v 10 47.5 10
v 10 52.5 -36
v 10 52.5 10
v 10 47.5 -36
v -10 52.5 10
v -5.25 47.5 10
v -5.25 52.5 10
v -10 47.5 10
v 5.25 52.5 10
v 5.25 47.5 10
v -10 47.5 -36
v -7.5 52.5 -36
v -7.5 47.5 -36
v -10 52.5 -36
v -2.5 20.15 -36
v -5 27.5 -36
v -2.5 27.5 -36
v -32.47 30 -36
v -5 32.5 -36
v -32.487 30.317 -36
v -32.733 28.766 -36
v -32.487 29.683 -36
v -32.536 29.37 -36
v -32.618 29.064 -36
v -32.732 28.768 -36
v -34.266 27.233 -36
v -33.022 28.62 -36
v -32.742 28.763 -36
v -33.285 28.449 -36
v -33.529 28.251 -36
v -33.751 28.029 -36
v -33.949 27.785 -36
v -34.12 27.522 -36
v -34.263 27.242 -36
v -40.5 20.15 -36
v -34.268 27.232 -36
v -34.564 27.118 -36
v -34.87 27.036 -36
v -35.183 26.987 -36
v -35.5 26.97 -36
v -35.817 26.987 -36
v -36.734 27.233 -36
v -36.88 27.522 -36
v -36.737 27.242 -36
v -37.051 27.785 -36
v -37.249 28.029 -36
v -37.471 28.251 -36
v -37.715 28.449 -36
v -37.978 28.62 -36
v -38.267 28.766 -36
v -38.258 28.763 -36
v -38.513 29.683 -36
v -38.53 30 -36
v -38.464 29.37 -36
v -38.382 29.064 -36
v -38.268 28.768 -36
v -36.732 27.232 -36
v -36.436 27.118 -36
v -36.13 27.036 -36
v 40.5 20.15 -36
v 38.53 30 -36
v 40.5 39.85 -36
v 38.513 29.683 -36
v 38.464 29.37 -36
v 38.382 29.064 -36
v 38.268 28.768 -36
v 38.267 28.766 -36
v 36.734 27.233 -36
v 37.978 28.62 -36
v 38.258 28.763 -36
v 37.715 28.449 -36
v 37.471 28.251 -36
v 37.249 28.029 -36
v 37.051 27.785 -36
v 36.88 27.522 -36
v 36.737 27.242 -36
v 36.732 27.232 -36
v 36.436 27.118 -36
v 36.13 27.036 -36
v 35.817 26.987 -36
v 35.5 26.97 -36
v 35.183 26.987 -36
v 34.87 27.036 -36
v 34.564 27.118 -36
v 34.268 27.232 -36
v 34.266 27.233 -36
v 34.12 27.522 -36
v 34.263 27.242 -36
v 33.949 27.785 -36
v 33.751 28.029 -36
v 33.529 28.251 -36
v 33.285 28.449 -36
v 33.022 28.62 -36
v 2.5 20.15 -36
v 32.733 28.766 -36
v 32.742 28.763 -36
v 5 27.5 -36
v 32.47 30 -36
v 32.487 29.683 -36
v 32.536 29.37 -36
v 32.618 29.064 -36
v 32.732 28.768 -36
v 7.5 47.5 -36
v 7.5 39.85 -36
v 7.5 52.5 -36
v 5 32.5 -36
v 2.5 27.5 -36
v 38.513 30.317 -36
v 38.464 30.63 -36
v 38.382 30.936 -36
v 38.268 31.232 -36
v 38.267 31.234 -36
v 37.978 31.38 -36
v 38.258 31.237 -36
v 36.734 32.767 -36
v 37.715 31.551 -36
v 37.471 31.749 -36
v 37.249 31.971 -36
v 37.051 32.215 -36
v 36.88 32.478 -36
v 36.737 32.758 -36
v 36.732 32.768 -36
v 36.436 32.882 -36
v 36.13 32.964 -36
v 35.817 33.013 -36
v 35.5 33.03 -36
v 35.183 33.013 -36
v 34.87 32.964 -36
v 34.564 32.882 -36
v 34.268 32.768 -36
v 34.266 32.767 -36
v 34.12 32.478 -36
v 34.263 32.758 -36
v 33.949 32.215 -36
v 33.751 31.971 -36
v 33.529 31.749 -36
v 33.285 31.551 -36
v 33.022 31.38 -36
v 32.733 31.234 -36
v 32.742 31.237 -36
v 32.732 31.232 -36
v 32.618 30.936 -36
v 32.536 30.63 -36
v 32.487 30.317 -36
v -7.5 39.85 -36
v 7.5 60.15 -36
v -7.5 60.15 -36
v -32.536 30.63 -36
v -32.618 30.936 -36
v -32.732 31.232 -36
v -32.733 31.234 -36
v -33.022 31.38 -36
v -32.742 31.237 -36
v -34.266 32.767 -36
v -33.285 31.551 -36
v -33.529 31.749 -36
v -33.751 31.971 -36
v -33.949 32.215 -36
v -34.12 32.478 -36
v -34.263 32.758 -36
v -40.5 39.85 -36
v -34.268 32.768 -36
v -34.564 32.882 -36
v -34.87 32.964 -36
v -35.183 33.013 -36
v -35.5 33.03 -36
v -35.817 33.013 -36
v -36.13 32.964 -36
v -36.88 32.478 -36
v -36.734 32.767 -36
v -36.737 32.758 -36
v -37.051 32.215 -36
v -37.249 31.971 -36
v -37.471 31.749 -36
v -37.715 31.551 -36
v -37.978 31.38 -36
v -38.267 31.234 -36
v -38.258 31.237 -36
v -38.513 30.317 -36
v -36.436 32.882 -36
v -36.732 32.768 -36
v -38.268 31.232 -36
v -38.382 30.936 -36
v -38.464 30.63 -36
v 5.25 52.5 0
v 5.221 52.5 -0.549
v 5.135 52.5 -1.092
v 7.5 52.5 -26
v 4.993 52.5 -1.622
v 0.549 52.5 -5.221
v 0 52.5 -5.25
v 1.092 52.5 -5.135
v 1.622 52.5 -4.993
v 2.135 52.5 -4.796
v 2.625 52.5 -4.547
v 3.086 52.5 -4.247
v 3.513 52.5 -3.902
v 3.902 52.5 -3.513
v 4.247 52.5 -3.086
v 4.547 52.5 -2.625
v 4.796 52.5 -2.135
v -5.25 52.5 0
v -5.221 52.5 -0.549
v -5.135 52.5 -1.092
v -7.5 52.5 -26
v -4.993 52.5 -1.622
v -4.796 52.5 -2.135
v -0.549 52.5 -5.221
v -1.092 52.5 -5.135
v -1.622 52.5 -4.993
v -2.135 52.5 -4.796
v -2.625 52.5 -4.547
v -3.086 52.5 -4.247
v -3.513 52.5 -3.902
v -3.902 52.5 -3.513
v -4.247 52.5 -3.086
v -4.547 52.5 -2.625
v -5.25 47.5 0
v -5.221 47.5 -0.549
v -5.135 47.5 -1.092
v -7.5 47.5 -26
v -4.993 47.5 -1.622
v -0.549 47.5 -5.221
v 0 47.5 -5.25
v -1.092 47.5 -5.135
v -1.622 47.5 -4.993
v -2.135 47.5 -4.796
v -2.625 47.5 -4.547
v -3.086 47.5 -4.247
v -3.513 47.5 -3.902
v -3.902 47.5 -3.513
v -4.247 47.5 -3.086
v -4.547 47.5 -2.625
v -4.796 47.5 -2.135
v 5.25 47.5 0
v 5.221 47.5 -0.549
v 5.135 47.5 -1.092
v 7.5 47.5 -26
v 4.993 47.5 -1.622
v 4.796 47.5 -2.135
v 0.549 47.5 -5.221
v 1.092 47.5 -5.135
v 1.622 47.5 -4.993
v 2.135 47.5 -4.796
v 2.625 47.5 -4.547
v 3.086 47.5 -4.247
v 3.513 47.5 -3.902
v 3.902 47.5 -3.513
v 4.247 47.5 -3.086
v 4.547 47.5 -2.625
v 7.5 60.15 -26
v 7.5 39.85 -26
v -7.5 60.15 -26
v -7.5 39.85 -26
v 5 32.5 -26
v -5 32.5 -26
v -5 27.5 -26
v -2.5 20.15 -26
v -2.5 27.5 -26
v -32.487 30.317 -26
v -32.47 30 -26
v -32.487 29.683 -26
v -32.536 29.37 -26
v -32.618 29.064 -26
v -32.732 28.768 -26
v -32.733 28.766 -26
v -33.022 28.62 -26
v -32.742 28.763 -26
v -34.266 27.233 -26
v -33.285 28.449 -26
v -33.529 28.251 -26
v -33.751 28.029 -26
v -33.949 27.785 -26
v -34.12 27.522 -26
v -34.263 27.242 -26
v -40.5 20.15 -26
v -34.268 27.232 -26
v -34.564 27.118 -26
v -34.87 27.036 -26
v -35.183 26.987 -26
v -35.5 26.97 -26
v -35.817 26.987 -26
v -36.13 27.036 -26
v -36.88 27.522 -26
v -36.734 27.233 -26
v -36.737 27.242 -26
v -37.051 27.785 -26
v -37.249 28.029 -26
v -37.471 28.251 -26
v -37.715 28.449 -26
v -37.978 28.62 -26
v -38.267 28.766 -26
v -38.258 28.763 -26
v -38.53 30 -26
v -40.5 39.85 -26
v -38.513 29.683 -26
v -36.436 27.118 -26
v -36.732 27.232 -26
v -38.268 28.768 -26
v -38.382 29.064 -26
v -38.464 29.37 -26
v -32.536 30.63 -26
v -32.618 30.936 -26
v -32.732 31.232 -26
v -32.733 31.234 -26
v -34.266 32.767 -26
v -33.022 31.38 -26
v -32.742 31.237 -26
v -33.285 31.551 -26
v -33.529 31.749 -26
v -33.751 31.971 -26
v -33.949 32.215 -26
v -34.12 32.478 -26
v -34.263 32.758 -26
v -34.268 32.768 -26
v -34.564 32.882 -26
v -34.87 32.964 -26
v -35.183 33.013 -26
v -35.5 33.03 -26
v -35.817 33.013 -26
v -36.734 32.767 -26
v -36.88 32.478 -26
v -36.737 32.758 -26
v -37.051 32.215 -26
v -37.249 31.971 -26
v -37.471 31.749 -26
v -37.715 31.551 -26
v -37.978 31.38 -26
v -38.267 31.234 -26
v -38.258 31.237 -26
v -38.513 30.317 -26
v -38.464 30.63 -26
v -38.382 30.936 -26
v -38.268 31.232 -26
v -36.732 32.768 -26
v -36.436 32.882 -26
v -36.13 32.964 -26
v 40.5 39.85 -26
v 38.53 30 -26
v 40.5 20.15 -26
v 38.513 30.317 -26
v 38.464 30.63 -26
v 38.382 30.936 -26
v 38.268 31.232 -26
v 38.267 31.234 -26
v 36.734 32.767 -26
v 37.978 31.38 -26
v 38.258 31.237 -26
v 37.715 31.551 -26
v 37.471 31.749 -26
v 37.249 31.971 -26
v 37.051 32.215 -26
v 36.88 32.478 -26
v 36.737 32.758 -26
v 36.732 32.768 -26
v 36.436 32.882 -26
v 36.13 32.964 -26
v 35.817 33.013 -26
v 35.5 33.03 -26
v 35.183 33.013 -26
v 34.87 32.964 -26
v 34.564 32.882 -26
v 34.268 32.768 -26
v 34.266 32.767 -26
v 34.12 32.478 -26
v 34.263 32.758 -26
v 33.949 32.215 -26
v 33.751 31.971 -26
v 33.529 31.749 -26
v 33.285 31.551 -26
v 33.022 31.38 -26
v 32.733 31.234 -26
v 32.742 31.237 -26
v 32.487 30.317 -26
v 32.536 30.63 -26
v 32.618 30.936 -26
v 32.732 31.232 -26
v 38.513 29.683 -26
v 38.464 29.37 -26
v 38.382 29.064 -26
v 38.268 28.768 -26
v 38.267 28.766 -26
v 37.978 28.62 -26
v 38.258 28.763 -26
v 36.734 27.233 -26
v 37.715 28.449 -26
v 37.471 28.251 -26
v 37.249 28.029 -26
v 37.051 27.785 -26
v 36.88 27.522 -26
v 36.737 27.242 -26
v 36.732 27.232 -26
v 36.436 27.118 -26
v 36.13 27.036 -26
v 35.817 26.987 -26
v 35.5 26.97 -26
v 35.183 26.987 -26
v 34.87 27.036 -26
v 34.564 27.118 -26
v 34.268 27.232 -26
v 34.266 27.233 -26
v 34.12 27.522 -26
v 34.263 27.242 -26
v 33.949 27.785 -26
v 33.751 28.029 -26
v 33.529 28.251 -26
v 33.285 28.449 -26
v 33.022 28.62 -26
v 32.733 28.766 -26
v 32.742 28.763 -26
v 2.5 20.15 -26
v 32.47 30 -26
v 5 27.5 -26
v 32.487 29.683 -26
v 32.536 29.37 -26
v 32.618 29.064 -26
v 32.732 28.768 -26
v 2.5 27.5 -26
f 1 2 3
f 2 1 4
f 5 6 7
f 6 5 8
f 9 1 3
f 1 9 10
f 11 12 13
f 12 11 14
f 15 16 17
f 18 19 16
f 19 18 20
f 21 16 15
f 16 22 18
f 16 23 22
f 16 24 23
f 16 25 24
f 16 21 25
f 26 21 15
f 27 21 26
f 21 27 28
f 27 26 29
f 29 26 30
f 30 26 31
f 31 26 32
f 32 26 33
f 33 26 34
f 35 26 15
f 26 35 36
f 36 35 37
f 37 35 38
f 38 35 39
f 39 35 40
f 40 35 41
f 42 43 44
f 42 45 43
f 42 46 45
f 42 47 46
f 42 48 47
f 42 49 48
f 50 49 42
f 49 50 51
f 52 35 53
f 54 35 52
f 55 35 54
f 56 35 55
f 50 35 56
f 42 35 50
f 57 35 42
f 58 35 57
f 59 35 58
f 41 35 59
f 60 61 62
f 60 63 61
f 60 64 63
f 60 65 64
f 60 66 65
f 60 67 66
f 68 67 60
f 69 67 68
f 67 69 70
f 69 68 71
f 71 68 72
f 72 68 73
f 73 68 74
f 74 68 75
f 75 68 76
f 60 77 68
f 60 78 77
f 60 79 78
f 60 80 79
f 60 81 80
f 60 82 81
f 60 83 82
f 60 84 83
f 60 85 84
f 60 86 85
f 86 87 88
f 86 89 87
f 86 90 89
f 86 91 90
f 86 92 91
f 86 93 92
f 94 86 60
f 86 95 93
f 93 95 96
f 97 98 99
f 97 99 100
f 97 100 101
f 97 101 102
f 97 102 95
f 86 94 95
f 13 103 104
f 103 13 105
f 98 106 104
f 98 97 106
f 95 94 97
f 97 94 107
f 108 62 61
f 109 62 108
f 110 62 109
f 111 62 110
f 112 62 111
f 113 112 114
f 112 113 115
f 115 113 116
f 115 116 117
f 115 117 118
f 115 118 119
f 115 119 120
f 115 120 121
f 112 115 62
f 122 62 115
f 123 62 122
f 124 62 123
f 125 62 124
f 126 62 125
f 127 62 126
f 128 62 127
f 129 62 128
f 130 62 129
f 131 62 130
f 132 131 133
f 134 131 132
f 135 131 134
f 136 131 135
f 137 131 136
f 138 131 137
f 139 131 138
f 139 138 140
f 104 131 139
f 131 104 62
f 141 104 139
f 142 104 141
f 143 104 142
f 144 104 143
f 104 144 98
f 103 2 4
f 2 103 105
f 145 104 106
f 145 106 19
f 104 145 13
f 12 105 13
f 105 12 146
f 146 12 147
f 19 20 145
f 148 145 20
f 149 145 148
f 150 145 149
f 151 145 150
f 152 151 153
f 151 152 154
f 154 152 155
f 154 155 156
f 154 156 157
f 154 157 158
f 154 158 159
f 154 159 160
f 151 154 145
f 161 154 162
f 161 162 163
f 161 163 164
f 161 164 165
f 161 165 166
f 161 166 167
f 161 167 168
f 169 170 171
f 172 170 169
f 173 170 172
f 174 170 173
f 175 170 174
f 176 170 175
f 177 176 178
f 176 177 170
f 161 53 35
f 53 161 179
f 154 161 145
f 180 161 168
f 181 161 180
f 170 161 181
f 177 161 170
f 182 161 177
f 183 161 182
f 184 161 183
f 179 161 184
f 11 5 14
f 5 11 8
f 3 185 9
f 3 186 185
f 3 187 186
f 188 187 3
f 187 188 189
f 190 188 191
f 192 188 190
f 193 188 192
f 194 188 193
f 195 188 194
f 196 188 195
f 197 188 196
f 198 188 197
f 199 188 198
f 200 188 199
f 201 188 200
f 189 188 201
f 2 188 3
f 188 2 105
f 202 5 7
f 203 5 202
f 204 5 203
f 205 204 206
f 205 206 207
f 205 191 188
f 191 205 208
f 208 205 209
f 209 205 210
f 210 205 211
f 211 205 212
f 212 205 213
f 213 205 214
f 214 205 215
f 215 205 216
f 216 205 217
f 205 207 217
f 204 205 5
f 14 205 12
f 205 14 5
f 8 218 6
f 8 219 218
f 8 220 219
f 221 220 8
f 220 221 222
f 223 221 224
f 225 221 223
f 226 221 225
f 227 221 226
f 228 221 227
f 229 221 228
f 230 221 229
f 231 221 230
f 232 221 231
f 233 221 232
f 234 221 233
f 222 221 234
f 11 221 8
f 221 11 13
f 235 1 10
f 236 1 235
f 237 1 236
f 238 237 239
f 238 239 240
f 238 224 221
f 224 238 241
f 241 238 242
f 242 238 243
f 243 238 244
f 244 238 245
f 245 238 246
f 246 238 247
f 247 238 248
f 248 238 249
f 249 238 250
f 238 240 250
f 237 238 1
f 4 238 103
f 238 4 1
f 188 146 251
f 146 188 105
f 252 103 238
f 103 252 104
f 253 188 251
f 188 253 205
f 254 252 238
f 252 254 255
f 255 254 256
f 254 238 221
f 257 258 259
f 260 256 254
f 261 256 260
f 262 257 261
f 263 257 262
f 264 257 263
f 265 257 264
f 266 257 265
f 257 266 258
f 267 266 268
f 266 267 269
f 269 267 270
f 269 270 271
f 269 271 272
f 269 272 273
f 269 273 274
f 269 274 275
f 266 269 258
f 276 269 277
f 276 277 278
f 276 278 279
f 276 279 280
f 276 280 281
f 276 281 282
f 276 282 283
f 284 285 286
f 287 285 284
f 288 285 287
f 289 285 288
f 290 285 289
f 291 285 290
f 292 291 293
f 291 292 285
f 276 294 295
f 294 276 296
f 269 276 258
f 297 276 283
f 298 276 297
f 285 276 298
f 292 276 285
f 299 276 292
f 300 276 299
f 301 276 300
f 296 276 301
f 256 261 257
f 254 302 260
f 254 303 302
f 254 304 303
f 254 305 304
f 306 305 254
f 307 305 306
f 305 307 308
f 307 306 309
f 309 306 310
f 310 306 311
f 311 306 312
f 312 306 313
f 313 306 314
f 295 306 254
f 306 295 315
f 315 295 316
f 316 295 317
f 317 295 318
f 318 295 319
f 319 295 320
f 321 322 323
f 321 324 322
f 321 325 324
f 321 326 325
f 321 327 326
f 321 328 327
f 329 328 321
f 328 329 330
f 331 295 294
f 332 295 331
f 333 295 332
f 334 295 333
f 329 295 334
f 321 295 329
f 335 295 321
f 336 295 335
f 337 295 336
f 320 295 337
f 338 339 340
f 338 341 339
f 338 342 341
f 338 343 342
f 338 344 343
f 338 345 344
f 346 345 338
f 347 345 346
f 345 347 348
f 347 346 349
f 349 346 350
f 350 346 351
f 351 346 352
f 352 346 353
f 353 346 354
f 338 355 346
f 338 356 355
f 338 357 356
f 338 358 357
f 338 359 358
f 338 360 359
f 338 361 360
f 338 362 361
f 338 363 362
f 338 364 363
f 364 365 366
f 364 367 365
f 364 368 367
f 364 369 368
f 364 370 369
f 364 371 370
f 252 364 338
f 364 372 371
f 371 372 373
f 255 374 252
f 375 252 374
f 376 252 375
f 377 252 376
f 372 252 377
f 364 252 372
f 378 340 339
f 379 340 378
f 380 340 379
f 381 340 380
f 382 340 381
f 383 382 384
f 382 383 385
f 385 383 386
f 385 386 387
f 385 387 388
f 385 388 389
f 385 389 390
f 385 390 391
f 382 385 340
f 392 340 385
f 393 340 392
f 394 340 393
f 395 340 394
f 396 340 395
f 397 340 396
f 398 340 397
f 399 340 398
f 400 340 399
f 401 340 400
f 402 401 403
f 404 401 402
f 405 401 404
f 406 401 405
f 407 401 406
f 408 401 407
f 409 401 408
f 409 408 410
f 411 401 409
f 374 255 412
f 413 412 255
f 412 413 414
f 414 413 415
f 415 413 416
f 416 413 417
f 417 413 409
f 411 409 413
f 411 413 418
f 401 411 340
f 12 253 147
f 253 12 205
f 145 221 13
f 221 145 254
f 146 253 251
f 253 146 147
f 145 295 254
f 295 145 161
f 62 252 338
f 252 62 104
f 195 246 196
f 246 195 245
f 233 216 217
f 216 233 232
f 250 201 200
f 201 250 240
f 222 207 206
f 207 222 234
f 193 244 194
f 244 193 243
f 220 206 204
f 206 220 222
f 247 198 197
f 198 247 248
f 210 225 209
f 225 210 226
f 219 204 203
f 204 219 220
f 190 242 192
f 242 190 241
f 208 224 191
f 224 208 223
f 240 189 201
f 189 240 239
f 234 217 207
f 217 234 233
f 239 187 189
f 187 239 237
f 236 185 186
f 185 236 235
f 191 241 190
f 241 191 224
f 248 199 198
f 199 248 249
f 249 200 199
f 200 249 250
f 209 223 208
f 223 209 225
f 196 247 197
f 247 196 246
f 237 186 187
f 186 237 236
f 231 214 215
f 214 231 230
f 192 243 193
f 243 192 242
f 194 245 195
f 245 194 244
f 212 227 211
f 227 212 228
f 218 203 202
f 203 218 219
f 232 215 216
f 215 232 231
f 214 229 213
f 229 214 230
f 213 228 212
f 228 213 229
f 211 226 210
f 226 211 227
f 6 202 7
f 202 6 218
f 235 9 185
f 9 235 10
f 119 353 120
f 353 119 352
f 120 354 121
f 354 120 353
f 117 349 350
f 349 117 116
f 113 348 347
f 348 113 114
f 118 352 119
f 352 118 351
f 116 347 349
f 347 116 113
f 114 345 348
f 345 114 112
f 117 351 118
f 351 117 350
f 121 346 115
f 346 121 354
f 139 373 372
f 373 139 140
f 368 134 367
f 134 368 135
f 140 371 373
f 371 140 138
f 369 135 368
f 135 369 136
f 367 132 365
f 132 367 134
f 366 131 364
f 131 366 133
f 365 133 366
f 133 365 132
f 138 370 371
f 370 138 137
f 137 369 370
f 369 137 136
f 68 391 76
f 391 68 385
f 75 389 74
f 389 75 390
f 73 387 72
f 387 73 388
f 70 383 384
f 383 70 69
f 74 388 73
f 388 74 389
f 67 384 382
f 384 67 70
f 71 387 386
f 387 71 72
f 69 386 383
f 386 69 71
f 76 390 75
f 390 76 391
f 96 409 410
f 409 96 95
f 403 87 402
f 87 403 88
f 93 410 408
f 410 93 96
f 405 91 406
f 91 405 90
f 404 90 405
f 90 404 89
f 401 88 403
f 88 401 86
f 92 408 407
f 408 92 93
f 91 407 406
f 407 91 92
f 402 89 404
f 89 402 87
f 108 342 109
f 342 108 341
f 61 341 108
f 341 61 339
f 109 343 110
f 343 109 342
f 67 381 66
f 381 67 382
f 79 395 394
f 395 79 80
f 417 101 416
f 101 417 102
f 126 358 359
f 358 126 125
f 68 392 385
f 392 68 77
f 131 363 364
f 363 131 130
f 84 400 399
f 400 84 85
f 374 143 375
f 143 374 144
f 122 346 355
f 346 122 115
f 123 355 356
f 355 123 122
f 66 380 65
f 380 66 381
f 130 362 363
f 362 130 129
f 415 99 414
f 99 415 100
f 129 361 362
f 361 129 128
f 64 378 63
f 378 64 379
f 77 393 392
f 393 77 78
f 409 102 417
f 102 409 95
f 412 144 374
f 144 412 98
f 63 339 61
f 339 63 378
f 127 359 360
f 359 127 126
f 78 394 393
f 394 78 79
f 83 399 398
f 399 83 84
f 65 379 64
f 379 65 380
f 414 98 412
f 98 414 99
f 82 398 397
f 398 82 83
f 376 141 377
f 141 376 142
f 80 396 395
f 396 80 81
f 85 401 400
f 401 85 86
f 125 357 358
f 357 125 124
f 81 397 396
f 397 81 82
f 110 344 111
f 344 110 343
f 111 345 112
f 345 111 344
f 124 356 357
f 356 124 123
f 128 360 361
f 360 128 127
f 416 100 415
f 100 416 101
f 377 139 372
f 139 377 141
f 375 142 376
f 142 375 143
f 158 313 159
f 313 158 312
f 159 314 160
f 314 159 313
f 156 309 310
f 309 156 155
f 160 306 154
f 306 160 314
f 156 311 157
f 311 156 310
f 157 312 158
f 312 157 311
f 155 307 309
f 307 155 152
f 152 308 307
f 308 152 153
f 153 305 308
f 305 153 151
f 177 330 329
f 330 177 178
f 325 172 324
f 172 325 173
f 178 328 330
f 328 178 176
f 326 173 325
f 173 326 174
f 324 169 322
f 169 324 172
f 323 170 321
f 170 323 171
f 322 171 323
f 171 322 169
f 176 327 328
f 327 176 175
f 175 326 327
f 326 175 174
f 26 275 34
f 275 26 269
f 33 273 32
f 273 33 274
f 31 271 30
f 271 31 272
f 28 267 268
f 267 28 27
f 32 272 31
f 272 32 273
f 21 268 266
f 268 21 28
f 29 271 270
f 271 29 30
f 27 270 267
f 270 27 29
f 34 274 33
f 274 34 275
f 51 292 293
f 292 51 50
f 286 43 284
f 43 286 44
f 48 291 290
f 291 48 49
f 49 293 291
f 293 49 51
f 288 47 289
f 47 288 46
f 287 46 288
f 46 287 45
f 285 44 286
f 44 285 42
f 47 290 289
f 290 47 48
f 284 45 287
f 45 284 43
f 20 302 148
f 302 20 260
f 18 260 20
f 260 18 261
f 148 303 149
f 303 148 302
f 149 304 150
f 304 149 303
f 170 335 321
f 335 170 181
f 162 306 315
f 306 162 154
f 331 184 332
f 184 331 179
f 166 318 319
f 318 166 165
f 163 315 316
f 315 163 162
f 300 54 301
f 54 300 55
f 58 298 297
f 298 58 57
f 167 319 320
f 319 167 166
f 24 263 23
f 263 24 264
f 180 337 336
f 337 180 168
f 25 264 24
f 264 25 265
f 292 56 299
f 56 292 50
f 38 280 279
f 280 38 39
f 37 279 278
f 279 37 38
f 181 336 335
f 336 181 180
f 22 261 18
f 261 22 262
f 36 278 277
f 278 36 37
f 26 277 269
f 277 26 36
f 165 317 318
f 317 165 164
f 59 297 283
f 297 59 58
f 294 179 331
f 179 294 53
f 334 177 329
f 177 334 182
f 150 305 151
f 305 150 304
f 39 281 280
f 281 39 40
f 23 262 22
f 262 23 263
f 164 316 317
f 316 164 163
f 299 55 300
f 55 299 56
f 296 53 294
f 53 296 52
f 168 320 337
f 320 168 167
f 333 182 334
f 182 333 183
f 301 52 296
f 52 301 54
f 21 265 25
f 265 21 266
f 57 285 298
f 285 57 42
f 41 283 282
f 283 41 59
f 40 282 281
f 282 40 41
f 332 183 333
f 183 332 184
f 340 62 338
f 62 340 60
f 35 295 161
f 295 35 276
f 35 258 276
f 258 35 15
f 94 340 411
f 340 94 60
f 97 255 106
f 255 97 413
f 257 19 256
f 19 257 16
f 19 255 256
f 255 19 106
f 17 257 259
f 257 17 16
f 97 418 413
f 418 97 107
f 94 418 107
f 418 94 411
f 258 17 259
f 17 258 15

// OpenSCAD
// ---------------PRINT FOLLOWING PARTS---------------
show_all = false; // Will force all parts to be shown at once.
print_single = true;

print_start_bar = false; //Color = Yellow
print_joint_cubes = false; //Color = Cyan
print_joint_bars = false; //Color = Blue
print_end_bar = false; //Color = Yellow
print_step_bar_joints = false; //Color = Green
print_lifting_joint_bars = false; //Color = Orange
print_slider_bar_joint = false; //Color = Red
print_step_holder_joint = false; //Color = Grey
print_support_base_front = false; //Color = Lime
print_support_base_back = true; //Color = Lime
print_support_base_step = true; //Color = Purple
print_support_bars = false; //Color = Pink

// For simulating the step from other file
print_step_box = false;

print_singles = show_all ? false : print_single; //Will reduce the amount of steps to 1 if true, and only print one model of each type.

// ---------------CHANGEABLE VARIABLES---------------
//Step Stats
step_width = 20;
step_length_x = 20;
step_amount = 4;

//Main Bar
bar_r = 5;
start_bar_l = 30;
end_bar_l = 10;

//Joint Bar
joint_bar_r = bar_r*0.6;

// ---------------STATIC VARIABLES---------------

//Amount of steps
step_amounts = print_singles ? 1 : step_amount;

//Joint
joint_cube = [bar_r*6, bar_r*2, bar_r*2];
joint_l = step_width+joint_cube[1]*1.1;

//End Main Bar
joint_amounts = step_amounts > 0 ? step_amounts+1 : step_amounts;
bar_end_dis = end_bar_l/2 + start_bar_l/2 + joint_cube[1]+ (step_width*step_amounts);

//Indents
indent_dis_main = bar_r*1.2;
indent_dis_joint = joint_bar_r*1.3;

//Step-Bar-Joint
step_bar_joint_h = joint_cube[2]*2;

//Other
y_length = bar_end_dis + end_bar_l*2;
step_support_width = step_width-0.3;

// ---------------MODULE SHAPES---------------

module small_bar(c, x_offset, y_offset, z_offset, length, rotation, hole){
    difference(){
        // Checking if the radius should be a for a hole or a bar
        // radius = hole ? joint_bar_r*1.05 : joint_bar_r; // ORIGINAL
        radius = hole ? joint_bar_r*1.01 : joint_bar_r; // THIGHTER
        
        // Making the main bar
        translate([x_offset, y_offset, z_offset])
            color(c)rotate(a = rotation)cylinder(r=radius, h=length, $fn=60, center=true);
        
        // Checking which axis the indents should be along, 
        // and sending is as the offset_push variable when making the indents in the bar.
        if(rotation[0] == 0 && rotation[1] == 0){
            indents(c, x_offset, y_offset, z_offset, length, rotation, hole, offset_push=[1,2,0]);
        } else if(rotation[0] == rotation[2]){
            indents(c, x_offset, y_offset, z_offset, length, rotation, hole, offset_push=[0,1,2]);
        } else {
            indents(c, x_offset, y_offset, z_offset, length, rotation, hole, offset_push=[1,0,2]);
        }
    }
}

module indents(c, x_offset, y_offset, z_offset, length, rotation, hole, offset_push){
    // The Indents on the side
    indent_dis = hole ? indent_dis_joint*1.02 : indent_dis_joint;
    k = indent_dis;
    x_push = offset_push[0];
    y_push = offset_push[1];
    z_push = offset_push[2];
    for(j = [[0,k,k],[0,-k,k],[0,k,-k],[0,-k,-k]]){
        translate([x_offset+j[x_push], y_offset+j[y_push], z_offset+j[z_push]])
        color(c)rotate(a = rotation)cylinder(r=joint_bar_r, h=length*2, $fn=60, center=true);
    }
}

// ---------------SETTING SHAPES---------------

//Start Bar, Color = Yellow
if(show_all ? true : print_start_bar){
    difference(){
        //Main Bar
        rotate(a = [90,0,0])cylinder(r=bar_r, h=start_bar_l, $fn=100, center=true);
        difference(){
            translate([0,5/2 -start_bar_l/2,0])
                rotate(a = [90,0,0])cylinder(d=5, h=5*1.1,, $fn=100, center=true);
            translate([0,5/2 -start_bar_l/2,2.5])
                cube([8,20,1], center=true);
            translate([0,5/2 -start_bar_l/2,-2.5])
                cube([8,20,1], center=true);
        }
        //Indents
        /*
        k = indent_dis_main;
        for(i = [[k,k],[-k,k],[k,-k],[-k,-k]]){
            translate([i[0], 0, i[1]])
                rotate(a = [90,0,0])cylinder(r=bar_r, h=start_bar_l*2, $fn=60, center=true);
        }
        */
    }
}

//End Bar, Color = Yellow
if(show_all ? true : print_end_bar){
    difference(){
        //Main Bar
        translate([0,bar_end_dis,0])
            rotate(a = [90,0,0])cylinder(r=bar_r, h=end_bar_l, $fn=100, center=true);
    
        //Indents
        /*
        k = indent_dis_main;
        for(i = [[k,k],[-k,k],[k,-k],[-k,-k]]){
            translate([i[0], bar_end_dis, i[1]])
                rotate(a = [90,0,0])cylinder(r=bar_r, h=end_bar_l*2, $fn=60, center=true);
        }
        */
    }
}

//Support Core, Color = Lime
if(show_all ? true : print_support_base_front){
    //Start Bar Holder
    y_length = step_width*2+0.3;
    translate([0,0,-joint_l])
            color("lime")cube([bar_r*3,y_length,bar_r*2], center=true);
    translate([0, y_length/4+(step_width-0.3)/2+10.2, -joint_l])
        color("lime")cube([10+1, 5+1,bar_r*2], center=true);
    translate([0, y_length/4+(step_width-0.3)/2+5, -joint_l])
        color("lime")cube([5+1 ,10,bar_r*2], center=true);
    difference(){
        translate([0,0,bar_r/2-(joint_l/2)])
            color("lime")cube([bar_r*4,bar_r,joint_l+bar_r*2*1.5], center=true);
        translate([0,0,0])
            rotate(a = [90,0,0])cylinder(r=bar_r*1.05, h=bar_r*2, $fn=60, center=true);
        translate([0,0,(bar_r*4/2)])
            rotate(a = [90,0,0])cube([(bar_r*1.05)*2,bar_r*4,bar_r*10], center=true);
    }
    echo(joint_l+bar_r);
}
if(show_all ? true : print_support_base_back){
    
    //End Bar Holder
    y_length = step_width+0.3;
    
    difference(){
        union(){
            translate([0,bar_end_dis,bar_r/2-(joint_l/2)])
                color("lime")cube([bar_r*4,bar_r,joint_l+bar_r*2*1.5], center=true);
            translate([0,bar_end_dis,-joint_l])
                color("lime")cube([bar_r*3,y_length,bar_r*2], center=true);
        }
        translate([0,bar_end_dis,0])
            rotate(a = [90,0,0])cylinder(r=bar_r*1.05, h=bar_r*2, $fn=60, center=true);
        translate([0,bar_end_dis,(bar_r*4/2)])
            rotate(a = [90,0,0])cube([(bar_r*1.05)*2,bar_r*4,bar_r*10], center=true);
        /*
        translate([0, bar_end_dis-0.2, -joint_l])
            cube([10,5,bar_r*2.5], center=true);
        translate([0, bar_end_dis-5.2, -joint_l])
            %cube([5,10,bar_r*2.5], center=true);
        translate([-5, bar_end_dis-0.2, -joint_l+6.2])
            rotate([90,0,0])linear_extrude(height = 5, center=true)
                polygon (points = [[0, 0],[10, 0],[5, 12]]);
        */
    }
        
}

//For Each Step
if(step_amounts > 0){
    for(i = [0 : step_amounts]){
        y_offset = start_bar_l/2 + (step_width)*(i-1) + joint_l/2 - 0.5;
        
//Joints Cubes, Color = Cyan
        startbar_printing = i != 0 || (i == 0 && (show_all ? true : print_start_bar));
        endbar_printing = i != step_amounts || (i == step_amounts && (show_all ? true : print_end_bar));
        if((show_all ? true : print_joint_cubes) && startbar_printing && endbar_printing){
            difference(){
                translate([0, start_bar_l/2+joint_cube[1]/2+step_width*i, 0])
                    color("cyan")cube(joint_cube, center=true);
                for(side = [bar_r*2, -bar_r*2]){
                    small_bar("yellow", side, y_offset, 0, joint_l, [90,0,0], hole = true);
                }
            }
        }
        
//Joint Bars, Color = Blue
        if(i != 0 && (show_all ? true : print_joint_bars)){
            side = i%2 == 0 ? bar_r*2 : -bar_r*2;
            small_bar("blue", side, y_offset, 0, joint_l, [90,0,0], hole = false);
        }
        
//Step Bar Joints, Color = Green
        if(i != 0 && (show_all ? true : print_step_bar_joints)){
            side = i%2 == 0 ? bar_r*2 : -bar_r*2;
            difference(){
                translate([side, y_offset, joint_cube[2]/2])
                    color("green")cube([bar_r*2, step_width-joint_cube[1]-1, bar_r*4], center=true);
                //Upper Hole
                difference(){
                    translate([side, y_offset, joint_cube[2]])
                        rotate(a = [90,0,90])cylinder(r=joint_bar_r*1.05, h=joint_l*10, $fn=60, center=true);
                }
                //Lower Hole
                difference(){
                    translate([side, y_offset, 0])
                        rotate(a = [90,0,0])cylinder(r=joint_bar_r*1.05, h=joint_l*10, $fn=60, center=true);
                }
            }
        }
//Lifting Joint Bars, Color = Orange
        if(i != 0 && (show_all ? true : print_lifting_joint_bars)){
            h_array = print_singles ? [joint_cube[2]] : [joint_cube[2], joint_cube[2]*4, joint_cube[2]*5];
            for(h = h_array){
                small_bar("orange", 0, y_offset, h, joint_l*2, [90,0,90], hole = false);
            }
        }
//Slider Bar Joint, Color = Red
        if(i != 0 && (show_all ? true : print_slider_bar_joint)){
            side_array_red = print_singles ? [bar_r*6.1] : [bar_r*6.1, -bar_r*6.1];
            for(side = side_array_red){
                difference(){
                    translate([side, y_offset, joint_cube[2]*3])
                        color("red")cube([bar_r*4, step_width-joint_cube[1]-1, bar_r*10], center=true);
                    //Indents
                    for(h = [joint_cube[2],joint_cube[2]*4, joint_cube[2]*5]){
                        small_bar("yellow", 0, y_offset, h, joint_l*2, [90,0,90], hole = true);
                    }
                    side_plus = side > 0 ? bar_r : -bar_r;
                    translate([side+side_plus, y_offset, 0])
                        cylinder(r=joint_bar_r*1.05, h=joint_l*10, $fn=60, center=true);
                }
            }
        }
// Step Holder Joint, Color = Grey
        if(i != 0 && (show_all ? true : print_step_holder_joint)){
            side_length = bar_r+step_length_x/2 + 0.5;
            side_array_grey = print_singles ?[side_length] : [side_length, -side_length];
            for(side = side_array_grey){
                difference(){
                    translate([side,y_offset,joint_cube[2]*4.5])
                        color("grey")cube([bar_r*2, step_width-joint_cube[1]-1, joint_cube[2]*2], center=true);
                    for(h = [joint_cube[2]*4, joint_cube[2]*5]){
                        small_bar("yellow", 0, y_offset, h, joint_l*2, [90,0,90], hole = true);
                    }
                }
            }
        }
        
// Support-base, Color = Purple
        if(i != 0 && (show_all ? true : print_support_base_step)){
            difference(){
                translate([0, y_offset, -joint_l])
                    color("purple")cube([(support_side_array[0]+bar_r)*2,step_support_width,bar_r*2], center=true);
                support_side_array = [bar_r*6.1+bar_r,-bar_r*6.1-bar_r];
                for(side = support_side_array){
                    small_bar("yellow", side, y_offset, -joint_l, joint_l*1.2, [0,0,0], hole = true);
                }
                translate([0, y_offset, -joint_l])
                    cube([10,5,bar_r*4], center=true);
                translate([0, y_offset-5, -joint_l])
                    cube([5,10,bar_r*4], center=true);
            }
            translate([0, y_offset+(step_width-0.3)/2+10.2, -joint_l])
                color("purple")cube([10 - 0.7, 5 - 0.7,bar_r*2], center=true);
            translate([0, y_offset+(step_width-0.3)/2+5, -joint_l])
                color("purple")cube([5 - 0.7,10,bar_r*2], center=true);
        }
// Support-bars, Color = Pink
        if(i != 0 && (show_all ? true : print_support_bars)){
            support_side_array = print_singles ? [bar_r*6.1+bar_r] : [bar_r*6.1+bar_r,-bar_r*6.1-bar_r];
            for(side = support_side_array){
                small_bar("pink", side, y_offset, 120/4, 120, [0,0,0], hole = false);
            }
        }
        // Simulate the cube of the step
        if(i != 0 && print_step_box){
            translate([0,y_offset,joint_cube[2]*3.5+15])
                cube([20,19,30], center=true);
        }
    }
    
}
